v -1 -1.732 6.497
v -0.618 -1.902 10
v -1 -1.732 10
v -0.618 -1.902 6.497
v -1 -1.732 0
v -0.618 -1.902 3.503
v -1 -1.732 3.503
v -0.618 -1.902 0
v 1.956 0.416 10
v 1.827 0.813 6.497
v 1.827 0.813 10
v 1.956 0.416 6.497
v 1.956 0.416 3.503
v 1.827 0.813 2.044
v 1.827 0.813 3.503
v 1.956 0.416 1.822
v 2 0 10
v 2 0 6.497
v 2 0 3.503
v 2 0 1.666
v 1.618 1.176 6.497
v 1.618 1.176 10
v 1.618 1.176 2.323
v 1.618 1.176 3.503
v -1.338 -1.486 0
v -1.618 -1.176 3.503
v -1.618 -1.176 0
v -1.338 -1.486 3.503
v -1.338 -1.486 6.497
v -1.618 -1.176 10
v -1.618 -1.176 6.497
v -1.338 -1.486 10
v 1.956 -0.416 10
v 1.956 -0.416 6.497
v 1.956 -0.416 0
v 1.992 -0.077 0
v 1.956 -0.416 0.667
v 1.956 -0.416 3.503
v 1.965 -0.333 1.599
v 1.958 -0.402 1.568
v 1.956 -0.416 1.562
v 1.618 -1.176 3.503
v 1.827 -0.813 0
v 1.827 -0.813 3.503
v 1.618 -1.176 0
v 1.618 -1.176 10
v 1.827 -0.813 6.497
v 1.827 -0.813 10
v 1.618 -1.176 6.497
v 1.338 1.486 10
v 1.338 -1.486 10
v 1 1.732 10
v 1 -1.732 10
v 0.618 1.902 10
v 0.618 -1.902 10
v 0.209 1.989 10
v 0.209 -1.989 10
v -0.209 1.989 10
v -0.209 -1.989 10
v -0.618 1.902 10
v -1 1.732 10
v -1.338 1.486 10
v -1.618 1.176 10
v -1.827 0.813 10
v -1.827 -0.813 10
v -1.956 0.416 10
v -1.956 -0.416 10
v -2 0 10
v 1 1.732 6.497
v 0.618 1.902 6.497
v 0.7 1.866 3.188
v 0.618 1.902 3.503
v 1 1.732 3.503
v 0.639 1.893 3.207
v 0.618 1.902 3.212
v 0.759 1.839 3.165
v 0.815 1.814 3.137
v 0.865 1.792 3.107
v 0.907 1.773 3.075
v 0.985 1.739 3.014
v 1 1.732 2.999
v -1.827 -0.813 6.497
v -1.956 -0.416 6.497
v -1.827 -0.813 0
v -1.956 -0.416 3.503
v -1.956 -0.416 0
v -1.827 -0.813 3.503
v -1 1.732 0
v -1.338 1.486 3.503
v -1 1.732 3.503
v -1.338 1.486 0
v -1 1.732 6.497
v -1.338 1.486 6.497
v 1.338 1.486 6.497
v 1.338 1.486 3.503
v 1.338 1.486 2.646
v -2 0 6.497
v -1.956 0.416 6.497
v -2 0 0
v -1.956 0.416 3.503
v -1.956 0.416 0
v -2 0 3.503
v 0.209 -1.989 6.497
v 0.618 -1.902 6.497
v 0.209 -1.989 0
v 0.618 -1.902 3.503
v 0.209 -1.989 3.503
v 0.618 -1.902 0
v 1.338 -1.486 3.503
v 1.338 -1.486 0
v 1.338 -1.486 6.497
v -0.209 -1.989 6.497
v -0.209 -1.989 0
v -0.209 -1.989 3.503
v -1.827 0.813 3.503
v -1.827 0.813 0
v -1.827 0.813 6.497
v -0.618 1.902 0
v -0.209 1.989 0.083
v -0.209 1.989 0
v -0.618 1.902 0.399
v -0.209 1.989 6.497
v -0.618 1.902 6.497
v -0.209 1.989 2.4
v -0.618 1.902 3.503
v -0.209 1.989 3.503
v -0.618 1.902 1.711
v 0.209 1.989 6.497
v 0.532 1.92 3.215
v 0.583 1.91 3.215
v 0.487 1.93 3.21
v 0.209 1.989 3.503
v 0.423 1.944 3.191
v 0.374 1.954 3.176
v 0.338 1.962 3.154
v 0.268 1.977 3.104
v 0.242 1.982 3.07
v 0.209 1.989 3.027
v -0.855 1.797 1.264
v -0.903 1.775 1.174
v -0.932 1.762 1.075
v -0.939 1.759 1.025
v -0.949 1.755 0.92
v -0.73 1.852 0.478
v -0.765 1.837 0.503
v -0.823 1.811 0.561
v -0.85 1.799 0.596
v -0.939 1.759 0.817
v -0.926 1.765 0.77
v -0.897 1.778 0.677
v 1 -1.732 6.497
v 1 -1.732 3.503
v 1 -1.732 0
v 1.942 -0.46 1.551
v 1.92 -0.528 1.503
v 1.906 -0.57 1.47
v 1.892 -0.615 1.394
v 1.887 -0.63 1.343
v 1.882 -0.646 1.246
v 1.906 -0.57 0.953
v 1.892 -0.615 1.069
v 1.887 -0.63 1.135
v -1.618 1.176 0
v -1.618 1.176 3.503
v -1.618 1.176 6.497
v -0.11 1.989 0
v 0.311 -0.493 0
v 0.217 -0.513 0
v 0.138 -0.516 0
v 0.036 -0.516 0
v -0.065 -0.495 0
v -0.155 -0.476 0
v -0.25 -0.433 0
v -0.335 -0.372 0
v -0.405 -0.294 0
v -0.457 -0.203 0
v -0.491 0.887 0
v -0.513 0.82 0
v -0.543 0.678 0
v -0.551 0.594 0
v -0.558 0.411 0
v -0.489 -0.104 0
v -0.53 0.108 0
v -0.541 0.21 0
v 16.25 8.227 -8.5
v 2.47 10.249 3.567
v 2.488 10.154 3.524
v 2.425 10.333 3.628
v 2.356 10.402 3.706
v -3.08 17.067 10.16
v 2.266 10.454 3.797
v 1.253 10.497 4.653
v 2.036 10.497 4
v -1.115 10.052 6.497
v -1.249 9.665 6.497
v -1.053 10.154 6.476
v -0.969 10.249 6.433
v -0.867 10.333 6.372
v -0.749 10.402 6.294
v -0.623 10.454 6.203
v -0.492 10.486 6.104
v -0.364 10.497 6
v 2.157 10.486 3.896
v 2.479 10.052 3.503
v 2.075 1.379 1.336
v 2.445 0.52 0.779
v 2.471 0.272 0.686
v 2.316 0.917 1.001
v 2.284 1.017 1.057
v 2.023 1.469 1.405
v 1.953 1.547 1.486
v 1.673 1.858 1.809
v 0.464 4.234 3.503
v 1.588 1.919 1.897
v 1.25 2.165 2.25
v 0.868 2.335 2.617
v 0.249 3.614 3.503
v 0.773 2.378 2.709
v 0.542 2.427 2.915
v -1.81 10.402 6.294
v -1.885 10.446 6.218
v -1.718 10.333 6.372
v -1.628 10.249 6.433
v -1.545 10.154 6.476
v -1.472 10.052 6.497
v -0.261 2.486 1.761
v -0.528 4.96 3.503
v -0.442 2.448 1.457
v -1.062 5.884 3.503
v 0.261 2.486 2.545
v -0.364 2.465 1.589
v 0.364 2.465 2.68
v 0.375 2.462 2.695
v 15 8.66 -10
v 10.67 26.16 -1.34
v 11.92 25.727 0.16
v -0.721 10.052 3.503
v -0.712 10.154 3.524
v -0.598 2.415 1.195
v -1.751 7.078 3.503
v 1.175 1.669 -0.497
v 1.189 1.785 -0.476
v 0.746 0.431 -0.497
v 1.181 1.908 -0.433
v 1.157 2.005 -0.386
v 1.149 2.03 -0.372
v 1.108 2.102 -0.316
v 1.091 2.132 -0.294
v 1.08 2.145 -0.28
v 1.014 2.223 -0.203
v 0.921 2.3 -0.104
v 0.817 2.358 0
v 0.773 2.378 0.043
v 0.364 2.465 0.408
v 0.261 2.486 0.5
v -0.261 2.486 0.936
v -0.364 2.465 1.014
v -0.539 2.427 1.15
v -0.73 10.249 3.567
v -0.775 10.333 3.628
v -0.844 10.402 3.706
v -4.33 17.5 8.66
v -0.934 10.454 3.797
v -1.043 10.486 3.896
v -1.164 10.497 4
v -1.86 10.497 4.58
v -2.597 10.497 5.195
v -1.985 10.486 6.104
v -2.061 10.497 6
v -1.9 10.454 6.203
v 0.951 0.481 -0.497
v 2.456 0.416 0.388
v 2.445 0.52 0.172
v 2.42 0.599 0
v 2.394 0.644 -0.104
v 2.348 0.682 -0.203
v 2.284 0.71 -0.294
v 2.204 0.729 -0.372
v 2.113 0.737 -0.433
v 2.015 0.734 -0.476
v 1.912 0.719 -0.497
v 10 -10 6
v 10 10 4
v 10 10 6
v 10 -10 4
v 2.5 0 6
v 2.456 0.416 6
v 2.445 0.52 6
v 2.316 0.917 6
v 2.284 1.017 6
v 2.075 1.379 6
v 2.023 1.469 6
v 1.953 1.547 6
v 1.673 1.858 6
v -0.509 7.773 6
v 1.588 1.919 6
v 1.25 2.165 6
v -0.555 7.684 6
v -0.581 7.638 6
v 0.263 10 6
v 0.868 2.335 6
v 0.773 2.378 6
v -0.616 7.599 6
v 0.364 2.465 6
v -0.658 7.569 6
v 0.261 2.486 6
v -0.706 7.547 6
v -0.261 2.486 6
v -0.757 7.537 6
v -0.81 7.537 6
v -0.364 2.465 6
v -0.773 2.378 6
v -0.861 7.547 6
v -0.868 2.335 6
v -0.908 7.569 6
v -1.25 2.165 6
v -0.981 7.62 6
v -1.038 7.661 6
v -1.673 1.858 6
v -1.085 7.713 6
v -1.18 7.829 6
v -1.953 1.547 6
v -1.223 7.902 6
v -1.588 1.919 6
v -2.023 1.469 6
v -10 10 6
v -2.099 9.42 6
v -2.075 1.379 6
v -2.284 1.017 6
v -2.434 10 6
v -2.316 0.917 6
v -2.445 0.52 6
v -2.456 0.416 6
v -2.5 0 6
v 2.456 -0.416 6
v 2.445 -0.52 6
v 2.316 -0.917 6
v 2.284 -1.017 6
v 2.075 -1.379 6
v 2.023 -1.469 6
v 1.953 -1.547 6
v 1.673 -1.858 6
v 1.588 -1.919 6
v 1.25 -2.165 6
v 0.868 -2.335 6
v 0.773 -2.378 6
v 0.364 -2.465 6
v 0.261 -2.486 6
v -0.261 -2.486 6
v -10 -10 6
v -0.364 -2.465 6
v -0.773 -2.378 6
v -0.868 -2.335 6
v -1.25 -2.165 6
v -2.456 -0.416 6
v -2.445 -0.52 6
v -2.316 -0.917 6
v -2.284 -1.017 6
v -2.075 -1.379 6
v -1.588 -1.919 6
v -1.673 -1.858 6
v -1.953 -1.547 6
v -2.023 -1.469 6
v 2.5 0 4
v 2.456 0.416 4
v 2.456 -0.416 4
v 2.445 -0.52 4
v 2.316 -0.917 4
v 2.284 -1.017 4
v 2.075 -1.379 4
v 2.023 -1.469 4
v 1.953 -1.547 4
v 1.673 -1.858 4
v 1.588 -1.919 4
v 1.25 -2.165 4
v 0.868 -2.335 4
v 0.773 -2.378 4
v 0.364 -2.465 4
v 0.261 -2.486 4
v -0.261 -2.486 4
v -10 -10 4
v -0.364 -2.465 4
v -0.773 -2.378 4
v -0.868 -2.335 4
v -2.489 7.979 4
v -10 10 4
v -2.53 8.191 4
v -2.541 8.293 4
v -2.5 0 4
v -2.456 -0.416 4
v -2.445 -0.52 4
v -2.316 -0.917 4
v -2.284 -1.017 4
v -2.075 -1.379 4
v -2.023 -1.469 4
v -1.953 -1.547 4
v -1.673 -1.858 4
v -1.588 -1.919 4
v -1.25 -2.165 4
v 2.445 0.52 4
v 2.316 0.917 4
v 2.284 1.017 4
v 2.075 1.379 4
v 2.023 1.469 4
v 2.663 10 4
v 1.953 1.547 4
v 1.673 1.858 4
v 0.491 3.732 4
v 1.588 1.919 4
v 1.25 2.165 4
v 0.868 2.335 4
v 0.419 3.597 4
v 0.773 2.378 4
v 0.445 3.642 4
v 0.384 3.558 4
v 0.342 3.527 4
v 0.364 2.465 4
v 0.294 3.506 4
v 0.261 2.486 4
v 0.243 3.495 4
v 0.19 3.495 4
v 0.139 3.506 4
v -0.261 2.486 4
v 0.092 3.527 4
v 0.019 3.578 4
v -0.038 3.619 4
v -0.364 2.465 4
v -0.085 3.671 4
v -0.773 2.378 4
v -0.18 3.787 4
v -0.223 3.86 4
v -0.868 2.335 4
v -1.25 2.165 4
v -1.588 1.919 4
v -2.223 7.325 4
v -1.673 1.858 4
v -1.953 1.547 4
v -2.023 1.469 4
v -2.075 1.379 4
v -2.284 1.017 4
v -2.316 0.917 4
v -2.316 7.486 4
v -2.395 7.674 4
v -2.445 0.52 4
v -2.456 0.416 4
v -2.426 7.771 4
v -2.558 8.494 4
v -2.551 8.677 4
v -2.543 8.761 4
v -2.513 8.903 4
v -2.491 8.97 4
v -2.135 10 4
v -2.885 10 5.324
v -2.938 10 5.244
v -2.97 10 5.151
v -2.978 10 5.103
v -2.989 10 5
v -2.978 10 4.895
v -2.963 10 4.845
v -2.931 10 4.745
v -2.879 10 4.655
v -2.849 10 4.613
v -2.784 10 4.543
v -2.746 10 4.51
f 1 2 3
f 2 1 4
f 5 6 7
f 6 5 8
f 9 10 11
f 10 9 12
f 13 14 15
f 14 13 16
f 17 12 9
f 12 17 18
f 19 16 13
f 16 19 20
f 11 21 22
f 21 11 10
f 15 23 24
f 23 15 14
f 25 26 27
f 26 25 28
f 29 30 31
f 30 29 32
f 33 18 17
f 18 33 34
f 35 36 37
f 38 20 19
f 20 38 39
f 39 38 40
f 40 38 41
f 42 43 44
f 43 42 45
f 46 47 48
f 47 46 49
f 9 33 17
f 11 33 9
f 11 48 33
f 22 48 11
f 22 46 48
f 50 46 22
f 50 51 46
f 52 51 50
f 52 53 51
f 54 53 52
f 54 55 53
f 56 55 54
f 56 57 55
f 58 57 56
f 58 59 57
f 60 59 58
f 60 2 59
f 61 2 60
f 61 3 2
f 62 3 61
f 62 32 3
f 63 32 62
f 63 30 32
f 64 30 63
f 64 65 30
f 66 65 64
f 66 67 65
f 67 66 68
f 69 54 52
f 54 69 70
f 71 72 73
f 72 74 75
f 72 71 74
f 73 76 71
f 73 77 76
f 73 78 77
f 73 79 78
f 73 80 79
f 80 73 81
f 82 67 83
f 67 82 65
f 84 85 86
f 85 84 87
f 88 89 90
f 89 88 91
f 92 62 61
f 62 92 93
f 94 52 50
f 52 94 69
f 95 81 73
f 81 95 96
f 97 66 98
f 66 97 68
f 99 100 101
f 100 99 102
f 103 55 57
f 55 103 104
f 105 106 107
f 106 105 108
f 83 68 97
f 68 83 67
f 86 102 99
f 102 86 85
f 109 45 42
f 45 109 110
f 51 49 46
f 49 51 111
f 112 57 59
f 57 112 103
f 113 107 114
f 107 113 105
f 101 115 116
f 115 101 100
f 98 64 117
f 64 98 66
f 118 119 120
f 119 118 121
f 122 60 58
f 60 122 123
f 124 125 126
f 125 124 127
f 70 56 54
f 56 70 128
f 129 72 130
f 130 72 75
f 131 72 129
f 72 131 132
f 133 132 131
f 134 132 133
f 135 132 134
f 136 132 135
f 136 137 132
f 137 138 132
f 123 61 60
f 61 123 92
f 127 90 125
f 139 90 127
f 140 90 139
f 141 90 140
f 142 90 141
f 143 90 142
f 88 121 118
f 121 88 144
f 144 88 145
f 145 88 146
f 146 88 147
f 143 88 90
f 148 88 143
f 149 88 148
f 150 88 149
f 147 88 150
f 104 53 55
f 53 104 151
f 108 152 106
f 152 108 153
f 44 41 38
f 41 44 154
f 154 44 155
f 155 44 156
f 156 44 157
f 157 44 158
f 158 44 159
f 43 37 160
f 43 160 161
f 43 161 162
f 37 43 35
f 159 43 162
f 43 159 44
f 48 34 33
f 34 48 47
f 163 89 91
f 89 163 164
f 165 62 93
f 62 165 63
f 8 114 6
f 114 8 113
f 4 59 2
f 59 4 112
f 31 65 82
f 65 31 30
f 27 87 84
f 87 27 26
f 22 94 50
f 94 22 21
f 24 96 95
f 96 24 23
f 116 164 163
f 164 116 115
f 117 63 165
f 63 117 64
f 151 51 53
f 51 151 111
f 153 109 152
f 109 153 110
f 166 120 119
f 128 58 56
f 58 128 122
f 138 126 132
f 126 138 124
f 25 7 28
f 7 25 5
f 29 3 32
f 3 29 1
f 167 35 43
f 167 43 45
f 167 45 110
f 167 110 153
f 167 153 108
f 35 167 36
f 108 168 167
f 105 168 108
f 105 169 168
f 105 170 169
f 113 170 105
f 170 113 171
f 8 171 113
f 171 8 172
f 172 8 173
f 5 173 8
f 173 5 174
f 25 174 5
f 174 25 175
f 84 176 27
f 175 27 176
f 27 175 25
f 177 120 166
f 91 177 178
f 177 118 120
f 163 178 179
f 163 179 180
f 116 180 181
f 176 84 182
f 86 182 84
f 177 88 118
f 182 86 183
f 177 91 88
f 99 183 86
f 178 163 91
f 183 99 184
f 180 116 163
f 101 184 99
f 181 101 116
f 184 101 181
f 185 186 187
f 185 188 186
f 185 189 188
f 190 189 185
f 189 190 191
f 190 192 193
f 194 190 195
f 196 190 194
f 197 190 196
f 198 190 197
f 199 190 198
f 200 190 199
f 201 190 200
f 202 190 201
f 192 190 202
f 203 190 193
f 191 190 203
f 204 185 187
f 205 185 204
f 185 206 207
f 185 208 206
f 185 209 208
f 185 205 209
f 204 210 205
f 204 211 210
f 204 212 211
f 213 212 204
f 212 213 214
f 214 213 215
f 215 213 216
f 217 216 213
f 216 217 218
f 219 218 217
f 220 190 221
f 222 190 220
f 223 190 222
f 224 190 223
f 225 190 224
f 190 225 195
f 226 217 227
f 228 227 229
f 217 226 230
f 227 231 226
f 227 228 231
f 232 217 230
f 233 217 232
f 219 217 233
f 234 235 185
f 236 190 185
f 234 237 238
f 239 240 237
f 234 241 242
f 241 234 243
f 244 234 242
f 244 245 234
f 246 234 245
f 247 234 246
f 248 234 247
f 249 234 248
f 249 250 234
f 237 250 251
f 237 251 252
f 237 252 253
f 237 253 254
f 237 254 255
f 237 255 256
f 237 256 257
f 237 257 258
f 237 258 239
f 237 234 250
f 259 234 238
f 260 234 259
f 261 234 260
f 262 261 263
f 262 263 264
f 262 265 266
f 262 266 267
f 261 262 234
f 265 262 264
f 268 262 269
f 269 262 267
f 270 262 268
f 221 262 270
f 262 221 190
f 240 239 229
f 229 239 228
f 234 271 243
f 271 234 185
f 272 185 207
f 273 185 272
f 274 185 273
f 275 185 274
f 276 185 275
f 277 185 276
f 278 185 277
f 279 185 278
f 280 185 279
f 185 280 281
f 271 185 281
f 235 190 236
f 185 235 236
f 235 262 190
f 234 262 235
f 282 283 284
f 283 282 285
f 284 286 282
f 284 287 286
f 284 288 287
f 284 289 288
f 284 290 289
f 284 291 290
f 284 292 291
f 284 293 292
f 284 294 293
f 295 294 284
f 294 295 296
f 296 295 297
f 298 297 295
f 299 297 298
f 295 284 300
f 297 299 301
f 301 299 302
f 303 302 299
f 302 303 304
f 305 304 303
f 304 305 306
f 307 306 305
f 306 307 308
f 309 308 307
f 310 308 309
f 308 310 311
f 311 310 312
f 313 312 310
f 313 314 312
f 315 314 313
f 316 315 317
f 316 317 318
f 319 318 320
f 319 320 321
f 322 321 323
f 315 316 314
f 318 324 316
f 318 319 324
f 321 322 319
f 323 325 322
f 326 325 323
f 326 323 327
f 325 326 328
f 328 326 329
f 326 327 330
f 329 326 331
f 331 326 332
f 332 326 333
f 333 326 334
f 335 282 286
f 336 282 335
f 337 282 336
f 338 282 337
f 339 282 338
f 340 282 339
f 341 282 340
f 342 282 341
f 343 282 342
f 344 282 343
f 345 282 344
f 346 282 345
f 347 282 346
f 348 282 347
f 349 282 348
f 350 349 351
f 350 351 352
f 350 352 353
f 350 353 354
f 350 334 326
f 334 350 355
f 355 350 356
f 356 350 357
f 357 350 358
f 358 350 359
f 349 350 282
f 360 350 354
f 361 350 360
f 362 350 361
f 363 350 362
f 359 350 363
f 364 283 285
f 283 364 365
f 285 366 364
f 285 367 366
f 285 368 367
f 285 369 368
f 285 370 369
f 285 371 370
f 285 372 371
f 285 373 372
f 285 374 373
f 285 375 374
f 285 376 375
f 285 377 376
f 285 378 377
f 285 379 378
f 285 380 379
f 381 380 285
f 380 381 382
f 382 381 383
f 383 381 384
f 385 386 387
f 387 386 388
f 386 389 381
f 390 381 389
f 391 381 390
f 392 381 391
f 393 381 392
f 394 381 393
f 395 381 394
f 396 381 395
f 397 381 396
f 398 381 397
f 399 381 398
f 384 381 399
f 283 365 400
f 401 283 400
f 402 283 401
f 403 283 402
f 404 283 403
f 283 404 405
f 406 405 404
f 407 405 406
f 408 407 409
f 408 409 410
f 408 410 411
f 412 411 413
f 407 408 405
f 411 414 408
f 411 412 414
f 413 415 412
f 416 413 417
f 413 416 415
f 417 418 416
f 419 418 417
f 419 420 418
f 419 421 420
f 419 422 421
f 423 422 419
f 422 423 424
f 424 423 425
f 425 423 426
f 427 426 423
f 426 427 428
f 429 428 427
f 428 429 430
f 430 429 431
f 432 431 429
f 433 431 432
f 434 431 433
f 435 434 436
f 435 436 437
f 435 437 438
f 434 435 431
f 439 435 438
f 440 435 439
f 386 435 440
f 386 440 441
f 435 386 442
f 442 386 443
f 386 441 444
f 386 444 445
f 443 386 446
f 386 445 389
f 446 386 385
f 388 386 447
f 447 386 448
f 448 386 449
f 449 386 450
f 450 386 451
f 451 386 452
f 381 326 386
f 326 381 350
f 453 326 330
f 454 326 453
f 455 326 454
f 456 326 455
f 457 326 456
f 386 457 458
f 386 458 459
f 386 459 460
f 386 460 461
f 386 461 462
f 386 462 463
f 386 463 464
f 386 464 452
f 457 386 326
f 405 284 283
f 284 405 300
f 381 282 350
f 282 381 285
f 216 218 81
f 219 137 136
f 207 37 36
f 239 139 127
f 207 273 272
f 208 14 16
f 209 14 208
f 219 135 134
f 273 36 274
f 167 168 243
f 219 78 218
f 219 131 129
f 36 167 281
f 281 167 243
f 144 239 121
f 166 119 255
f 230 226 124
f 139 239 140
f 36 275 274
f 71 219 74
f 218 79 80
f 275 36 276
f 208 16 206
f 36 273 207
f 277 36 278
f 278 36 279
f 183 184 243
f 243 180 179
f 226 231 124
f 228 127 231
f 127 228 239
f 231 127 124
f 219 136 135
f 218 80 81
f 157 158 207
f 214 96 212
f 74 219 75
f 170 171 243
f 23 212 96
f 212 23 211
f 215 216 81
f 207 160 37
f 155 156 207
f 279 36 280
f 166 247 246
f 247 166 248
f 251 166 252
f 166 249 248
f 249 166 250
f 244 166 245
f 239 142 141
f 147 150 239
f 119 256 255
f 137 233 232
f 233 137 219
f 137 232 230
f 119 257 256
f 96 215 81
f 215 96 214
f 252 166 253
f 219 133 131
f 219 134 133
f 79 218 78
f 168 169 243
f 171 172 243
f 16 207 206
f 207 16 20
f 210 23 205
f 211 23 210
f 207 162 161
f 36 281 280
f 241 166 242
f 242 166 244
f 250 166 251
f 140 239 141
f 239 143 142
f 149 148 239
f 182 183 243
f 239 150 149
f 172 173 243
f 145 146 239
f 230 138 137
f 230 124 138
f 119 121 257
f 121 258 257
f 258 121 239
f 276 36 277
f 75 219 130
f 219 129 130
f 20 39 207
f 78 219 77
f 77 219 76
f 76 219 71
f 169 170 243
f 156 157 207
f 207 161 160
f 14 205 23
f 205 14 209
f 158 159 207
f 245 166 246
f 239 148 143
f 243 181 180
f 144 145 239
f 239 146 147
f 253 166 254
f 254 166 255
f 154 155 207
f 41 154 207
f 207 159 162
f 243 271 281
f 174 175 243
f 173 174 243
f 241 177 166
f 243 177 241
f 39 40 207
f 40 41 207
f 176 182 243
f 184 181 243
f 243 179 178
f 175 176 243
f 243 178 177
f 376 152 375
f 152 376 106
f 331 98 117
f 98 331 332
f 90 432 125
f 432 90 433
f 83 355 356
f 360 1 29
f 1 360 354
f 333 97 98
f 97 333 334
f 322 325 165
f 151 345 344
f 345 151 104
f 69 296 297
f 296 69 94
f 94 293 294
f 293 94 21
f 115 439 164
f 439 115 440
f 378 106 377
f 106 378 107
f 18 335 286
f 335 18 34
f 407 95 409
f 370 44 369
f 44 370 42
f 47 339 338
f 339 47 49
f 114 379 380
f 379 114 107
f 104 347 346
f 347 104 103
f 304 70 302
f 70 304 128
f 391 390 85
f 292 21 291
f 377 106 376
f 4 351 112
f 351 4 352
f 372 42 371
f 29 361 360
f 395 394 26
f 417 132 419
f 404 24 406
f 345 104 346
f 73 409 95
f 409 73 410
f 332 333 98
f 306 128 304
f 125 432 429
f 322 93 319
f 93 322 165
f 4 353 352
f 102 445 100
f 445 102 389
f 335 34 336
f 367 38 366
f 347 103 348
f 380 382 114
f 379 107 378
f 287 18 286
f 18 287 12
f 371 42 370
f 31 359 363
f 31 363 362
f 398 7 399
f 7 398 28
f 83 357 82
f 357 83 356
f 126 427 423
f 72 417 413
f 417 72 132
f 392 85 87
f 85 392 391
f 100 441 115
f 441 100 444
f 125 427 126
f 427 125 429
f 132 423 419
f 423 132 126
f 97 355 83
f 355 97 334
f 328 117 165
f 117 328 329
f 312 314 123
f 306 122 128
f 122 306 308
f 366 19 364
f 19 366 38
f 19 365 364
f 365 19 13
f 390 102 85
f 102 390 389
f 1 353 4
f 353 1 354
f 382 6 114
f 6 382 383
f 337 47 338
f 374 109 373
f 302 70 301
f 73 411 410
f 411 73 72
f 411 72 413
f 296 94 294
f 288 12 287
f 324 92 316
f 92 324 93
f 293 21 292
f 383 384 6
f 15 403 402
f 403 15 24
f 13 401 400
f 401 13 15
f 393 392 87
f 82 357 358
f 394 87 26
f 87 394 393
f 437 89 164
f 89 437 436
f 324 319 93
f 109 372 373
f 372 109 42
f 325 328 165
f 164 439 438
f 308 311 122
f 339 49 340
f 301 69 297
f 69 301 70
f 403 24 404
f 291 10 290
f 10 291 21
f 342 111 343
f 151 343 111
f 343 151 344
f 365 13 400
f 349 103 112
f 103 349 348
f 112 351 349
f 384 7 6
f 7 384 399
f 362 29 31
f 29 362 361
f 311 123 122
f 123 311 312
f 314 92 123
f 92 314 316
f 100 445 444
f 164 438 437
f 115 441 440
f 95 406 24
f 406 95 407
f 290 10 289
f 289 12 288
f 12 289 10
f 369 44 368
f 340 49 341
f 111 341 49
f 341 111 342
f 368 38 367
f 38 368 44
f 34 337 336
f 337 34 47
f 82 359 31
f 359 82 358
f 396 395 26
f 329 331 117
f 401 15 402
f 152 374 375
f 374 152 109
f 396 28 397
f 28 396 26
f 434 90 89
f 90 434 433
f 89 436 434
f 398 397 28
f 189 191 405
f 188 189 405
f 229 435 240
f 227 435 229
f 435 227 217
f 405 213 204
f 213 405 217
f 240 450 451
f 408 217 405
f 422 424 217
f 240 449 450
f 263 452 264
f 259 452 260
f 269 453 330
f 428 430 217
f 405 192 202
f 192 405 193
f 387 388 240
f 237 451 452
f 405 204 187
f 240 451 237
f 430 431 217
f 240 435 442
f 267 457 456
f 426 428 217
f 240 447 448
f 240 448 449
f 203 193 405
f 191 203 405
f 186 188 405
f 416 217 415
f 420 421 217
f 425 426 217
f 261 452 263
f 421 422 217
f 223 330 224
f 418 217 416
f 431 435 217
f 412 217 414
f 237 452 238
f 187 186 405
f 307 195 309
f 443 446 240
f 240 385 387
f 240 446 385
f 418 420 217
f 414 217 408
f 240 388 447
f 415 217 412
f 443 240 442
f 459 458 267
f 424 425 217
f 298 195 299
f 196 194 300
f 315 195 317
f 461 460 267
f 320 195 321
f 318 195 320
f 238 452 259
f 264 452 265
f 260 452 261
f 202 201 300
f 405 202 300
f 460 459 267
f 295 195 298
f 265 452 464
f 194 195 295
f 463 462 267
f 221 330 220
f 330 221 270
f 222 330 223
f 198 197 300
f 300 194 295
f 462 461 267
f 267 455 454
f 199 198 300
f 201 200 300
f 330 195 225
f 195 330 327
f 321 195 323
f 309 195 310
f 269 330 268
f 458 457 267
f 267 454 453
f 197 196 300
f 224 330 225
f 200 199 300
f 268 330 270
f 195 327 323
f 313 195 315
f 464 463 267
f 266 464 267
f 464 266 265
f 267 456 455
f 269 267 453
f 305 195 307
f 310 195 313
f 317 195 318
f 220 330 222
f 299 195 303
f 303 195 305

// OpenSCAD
$fn = 30;

// Examples

Chamfer_3d(mode = "sphere") {
  // Chamfer_3d(mode="fast",dir=[true,true,false,false,true,true]) {
  // Chamfer_3d(mode="sphere") {
  // Chamfer_3d(mode="cube") {
  // Chamfer_3d([[0,1],[0,2],[1,2]],.5) {
  // Chamfer_3d([[0,1],[0,2]]) {
  // Chamfer_3d([[0,1],[0,2]],.5) {
  cylinder(r = 2, h = 10);

  rotate([ 30, 30, 30 ]) cube([ 20, 20, 2 ]);

  translate([ 0, 0, 5 ]) cube([ 20, 20, 2 ], center = true);
};

// for two arrays, generate permutations of their members
// generate [1,2], exclude [1,1] and [2,1]
function permutations(arr1, arr2) =
    [for (i = 0, j = 1; (i < len(arr1)) && (j < len(arr2));
          i = (j == len(arr2) - 1) ? i + 1 : i,
          j = (j == len(arr2) - 1) ? i + 1 : j + 1)[arr1[i], arr2[j]]];
// generate permutations of an array's members with itself
function permSelf(arr) = permutations(arr, arr);

//-----------------------------------------------
// Create a chamfer between two or more surfaces
//
// A subset of surface pairs may be specified
//
// Call with N = List of surface subsets
//           N = [[child#,child#],[child#,child#,]...]
//           for 2 objects N = [[0,1]]
//           for 3 objects intersection 0 and 1 N = [[0,1],[0,2]]
// dr   = chamfer height (approx)
// mode = chamfer mode: fast (uses shifting), sphere, cube (use minkowski())
// dir  = use to restrict shifting in certain directions

module Chamfer_3d(N, dr = .5, mode = "fast",
                  dir = [ true, true, true, true, true, true ]) {
  children();

  _n = (N != undef) ? N : permSelf([for (i = [0:$children - 1]) i]);

  for (i = _n) {
    hull() {
      intersection() {
        children(i[0]);
        Expand_3d(dr, mode, dir) children(i[1]);
      }

      intersection() {
        Expand_3d(dr, mode, dir) children(i[0]);
        children(i[1]);
      }
    }
  }
}

//--------------------------------------------------
// Expand a child object by shifting or minkowski
// Since the center of an object is not known,
//     a simple scale(S) children() is not possible
//
// An object can be expanded by creating a composite object
// either using minkowski() children(); sphere(r),cube(r,center=true) etc.
// or by shifting the object on multiple axis
//
// dr   = absolute expansion
// mode = fast (uses shifting), sphere, cube (use minkowski())
// dir  = use to restrict shifting in certain directions

module Expand_3d(dr = .5, mode = "fast",
                 dir = [ true, true, true, true, true, true ]) {

  assert(((mode == "fast") || (mode == "sphere") || (mode == "cube")));

  if (mode == "fast") {

    shiftList = [[dr, 0, 0], [-dr, 0, 0], [0, dr, 0], [0, -dr, 0], [0, 0, dr],
                 [0, 0, -dr]];
    for (i = [0:5]) {
      if (dir[i] == true) {
        translate(shiftList[i]) children();
      }
    }

  } else {
    minkowski() {
      children();
      if (mode == "sphere") {
        sphere(r = dr);
      } else if (mode == "cube") {
        cube(dr, center = true);
      }
    }
  }
}
